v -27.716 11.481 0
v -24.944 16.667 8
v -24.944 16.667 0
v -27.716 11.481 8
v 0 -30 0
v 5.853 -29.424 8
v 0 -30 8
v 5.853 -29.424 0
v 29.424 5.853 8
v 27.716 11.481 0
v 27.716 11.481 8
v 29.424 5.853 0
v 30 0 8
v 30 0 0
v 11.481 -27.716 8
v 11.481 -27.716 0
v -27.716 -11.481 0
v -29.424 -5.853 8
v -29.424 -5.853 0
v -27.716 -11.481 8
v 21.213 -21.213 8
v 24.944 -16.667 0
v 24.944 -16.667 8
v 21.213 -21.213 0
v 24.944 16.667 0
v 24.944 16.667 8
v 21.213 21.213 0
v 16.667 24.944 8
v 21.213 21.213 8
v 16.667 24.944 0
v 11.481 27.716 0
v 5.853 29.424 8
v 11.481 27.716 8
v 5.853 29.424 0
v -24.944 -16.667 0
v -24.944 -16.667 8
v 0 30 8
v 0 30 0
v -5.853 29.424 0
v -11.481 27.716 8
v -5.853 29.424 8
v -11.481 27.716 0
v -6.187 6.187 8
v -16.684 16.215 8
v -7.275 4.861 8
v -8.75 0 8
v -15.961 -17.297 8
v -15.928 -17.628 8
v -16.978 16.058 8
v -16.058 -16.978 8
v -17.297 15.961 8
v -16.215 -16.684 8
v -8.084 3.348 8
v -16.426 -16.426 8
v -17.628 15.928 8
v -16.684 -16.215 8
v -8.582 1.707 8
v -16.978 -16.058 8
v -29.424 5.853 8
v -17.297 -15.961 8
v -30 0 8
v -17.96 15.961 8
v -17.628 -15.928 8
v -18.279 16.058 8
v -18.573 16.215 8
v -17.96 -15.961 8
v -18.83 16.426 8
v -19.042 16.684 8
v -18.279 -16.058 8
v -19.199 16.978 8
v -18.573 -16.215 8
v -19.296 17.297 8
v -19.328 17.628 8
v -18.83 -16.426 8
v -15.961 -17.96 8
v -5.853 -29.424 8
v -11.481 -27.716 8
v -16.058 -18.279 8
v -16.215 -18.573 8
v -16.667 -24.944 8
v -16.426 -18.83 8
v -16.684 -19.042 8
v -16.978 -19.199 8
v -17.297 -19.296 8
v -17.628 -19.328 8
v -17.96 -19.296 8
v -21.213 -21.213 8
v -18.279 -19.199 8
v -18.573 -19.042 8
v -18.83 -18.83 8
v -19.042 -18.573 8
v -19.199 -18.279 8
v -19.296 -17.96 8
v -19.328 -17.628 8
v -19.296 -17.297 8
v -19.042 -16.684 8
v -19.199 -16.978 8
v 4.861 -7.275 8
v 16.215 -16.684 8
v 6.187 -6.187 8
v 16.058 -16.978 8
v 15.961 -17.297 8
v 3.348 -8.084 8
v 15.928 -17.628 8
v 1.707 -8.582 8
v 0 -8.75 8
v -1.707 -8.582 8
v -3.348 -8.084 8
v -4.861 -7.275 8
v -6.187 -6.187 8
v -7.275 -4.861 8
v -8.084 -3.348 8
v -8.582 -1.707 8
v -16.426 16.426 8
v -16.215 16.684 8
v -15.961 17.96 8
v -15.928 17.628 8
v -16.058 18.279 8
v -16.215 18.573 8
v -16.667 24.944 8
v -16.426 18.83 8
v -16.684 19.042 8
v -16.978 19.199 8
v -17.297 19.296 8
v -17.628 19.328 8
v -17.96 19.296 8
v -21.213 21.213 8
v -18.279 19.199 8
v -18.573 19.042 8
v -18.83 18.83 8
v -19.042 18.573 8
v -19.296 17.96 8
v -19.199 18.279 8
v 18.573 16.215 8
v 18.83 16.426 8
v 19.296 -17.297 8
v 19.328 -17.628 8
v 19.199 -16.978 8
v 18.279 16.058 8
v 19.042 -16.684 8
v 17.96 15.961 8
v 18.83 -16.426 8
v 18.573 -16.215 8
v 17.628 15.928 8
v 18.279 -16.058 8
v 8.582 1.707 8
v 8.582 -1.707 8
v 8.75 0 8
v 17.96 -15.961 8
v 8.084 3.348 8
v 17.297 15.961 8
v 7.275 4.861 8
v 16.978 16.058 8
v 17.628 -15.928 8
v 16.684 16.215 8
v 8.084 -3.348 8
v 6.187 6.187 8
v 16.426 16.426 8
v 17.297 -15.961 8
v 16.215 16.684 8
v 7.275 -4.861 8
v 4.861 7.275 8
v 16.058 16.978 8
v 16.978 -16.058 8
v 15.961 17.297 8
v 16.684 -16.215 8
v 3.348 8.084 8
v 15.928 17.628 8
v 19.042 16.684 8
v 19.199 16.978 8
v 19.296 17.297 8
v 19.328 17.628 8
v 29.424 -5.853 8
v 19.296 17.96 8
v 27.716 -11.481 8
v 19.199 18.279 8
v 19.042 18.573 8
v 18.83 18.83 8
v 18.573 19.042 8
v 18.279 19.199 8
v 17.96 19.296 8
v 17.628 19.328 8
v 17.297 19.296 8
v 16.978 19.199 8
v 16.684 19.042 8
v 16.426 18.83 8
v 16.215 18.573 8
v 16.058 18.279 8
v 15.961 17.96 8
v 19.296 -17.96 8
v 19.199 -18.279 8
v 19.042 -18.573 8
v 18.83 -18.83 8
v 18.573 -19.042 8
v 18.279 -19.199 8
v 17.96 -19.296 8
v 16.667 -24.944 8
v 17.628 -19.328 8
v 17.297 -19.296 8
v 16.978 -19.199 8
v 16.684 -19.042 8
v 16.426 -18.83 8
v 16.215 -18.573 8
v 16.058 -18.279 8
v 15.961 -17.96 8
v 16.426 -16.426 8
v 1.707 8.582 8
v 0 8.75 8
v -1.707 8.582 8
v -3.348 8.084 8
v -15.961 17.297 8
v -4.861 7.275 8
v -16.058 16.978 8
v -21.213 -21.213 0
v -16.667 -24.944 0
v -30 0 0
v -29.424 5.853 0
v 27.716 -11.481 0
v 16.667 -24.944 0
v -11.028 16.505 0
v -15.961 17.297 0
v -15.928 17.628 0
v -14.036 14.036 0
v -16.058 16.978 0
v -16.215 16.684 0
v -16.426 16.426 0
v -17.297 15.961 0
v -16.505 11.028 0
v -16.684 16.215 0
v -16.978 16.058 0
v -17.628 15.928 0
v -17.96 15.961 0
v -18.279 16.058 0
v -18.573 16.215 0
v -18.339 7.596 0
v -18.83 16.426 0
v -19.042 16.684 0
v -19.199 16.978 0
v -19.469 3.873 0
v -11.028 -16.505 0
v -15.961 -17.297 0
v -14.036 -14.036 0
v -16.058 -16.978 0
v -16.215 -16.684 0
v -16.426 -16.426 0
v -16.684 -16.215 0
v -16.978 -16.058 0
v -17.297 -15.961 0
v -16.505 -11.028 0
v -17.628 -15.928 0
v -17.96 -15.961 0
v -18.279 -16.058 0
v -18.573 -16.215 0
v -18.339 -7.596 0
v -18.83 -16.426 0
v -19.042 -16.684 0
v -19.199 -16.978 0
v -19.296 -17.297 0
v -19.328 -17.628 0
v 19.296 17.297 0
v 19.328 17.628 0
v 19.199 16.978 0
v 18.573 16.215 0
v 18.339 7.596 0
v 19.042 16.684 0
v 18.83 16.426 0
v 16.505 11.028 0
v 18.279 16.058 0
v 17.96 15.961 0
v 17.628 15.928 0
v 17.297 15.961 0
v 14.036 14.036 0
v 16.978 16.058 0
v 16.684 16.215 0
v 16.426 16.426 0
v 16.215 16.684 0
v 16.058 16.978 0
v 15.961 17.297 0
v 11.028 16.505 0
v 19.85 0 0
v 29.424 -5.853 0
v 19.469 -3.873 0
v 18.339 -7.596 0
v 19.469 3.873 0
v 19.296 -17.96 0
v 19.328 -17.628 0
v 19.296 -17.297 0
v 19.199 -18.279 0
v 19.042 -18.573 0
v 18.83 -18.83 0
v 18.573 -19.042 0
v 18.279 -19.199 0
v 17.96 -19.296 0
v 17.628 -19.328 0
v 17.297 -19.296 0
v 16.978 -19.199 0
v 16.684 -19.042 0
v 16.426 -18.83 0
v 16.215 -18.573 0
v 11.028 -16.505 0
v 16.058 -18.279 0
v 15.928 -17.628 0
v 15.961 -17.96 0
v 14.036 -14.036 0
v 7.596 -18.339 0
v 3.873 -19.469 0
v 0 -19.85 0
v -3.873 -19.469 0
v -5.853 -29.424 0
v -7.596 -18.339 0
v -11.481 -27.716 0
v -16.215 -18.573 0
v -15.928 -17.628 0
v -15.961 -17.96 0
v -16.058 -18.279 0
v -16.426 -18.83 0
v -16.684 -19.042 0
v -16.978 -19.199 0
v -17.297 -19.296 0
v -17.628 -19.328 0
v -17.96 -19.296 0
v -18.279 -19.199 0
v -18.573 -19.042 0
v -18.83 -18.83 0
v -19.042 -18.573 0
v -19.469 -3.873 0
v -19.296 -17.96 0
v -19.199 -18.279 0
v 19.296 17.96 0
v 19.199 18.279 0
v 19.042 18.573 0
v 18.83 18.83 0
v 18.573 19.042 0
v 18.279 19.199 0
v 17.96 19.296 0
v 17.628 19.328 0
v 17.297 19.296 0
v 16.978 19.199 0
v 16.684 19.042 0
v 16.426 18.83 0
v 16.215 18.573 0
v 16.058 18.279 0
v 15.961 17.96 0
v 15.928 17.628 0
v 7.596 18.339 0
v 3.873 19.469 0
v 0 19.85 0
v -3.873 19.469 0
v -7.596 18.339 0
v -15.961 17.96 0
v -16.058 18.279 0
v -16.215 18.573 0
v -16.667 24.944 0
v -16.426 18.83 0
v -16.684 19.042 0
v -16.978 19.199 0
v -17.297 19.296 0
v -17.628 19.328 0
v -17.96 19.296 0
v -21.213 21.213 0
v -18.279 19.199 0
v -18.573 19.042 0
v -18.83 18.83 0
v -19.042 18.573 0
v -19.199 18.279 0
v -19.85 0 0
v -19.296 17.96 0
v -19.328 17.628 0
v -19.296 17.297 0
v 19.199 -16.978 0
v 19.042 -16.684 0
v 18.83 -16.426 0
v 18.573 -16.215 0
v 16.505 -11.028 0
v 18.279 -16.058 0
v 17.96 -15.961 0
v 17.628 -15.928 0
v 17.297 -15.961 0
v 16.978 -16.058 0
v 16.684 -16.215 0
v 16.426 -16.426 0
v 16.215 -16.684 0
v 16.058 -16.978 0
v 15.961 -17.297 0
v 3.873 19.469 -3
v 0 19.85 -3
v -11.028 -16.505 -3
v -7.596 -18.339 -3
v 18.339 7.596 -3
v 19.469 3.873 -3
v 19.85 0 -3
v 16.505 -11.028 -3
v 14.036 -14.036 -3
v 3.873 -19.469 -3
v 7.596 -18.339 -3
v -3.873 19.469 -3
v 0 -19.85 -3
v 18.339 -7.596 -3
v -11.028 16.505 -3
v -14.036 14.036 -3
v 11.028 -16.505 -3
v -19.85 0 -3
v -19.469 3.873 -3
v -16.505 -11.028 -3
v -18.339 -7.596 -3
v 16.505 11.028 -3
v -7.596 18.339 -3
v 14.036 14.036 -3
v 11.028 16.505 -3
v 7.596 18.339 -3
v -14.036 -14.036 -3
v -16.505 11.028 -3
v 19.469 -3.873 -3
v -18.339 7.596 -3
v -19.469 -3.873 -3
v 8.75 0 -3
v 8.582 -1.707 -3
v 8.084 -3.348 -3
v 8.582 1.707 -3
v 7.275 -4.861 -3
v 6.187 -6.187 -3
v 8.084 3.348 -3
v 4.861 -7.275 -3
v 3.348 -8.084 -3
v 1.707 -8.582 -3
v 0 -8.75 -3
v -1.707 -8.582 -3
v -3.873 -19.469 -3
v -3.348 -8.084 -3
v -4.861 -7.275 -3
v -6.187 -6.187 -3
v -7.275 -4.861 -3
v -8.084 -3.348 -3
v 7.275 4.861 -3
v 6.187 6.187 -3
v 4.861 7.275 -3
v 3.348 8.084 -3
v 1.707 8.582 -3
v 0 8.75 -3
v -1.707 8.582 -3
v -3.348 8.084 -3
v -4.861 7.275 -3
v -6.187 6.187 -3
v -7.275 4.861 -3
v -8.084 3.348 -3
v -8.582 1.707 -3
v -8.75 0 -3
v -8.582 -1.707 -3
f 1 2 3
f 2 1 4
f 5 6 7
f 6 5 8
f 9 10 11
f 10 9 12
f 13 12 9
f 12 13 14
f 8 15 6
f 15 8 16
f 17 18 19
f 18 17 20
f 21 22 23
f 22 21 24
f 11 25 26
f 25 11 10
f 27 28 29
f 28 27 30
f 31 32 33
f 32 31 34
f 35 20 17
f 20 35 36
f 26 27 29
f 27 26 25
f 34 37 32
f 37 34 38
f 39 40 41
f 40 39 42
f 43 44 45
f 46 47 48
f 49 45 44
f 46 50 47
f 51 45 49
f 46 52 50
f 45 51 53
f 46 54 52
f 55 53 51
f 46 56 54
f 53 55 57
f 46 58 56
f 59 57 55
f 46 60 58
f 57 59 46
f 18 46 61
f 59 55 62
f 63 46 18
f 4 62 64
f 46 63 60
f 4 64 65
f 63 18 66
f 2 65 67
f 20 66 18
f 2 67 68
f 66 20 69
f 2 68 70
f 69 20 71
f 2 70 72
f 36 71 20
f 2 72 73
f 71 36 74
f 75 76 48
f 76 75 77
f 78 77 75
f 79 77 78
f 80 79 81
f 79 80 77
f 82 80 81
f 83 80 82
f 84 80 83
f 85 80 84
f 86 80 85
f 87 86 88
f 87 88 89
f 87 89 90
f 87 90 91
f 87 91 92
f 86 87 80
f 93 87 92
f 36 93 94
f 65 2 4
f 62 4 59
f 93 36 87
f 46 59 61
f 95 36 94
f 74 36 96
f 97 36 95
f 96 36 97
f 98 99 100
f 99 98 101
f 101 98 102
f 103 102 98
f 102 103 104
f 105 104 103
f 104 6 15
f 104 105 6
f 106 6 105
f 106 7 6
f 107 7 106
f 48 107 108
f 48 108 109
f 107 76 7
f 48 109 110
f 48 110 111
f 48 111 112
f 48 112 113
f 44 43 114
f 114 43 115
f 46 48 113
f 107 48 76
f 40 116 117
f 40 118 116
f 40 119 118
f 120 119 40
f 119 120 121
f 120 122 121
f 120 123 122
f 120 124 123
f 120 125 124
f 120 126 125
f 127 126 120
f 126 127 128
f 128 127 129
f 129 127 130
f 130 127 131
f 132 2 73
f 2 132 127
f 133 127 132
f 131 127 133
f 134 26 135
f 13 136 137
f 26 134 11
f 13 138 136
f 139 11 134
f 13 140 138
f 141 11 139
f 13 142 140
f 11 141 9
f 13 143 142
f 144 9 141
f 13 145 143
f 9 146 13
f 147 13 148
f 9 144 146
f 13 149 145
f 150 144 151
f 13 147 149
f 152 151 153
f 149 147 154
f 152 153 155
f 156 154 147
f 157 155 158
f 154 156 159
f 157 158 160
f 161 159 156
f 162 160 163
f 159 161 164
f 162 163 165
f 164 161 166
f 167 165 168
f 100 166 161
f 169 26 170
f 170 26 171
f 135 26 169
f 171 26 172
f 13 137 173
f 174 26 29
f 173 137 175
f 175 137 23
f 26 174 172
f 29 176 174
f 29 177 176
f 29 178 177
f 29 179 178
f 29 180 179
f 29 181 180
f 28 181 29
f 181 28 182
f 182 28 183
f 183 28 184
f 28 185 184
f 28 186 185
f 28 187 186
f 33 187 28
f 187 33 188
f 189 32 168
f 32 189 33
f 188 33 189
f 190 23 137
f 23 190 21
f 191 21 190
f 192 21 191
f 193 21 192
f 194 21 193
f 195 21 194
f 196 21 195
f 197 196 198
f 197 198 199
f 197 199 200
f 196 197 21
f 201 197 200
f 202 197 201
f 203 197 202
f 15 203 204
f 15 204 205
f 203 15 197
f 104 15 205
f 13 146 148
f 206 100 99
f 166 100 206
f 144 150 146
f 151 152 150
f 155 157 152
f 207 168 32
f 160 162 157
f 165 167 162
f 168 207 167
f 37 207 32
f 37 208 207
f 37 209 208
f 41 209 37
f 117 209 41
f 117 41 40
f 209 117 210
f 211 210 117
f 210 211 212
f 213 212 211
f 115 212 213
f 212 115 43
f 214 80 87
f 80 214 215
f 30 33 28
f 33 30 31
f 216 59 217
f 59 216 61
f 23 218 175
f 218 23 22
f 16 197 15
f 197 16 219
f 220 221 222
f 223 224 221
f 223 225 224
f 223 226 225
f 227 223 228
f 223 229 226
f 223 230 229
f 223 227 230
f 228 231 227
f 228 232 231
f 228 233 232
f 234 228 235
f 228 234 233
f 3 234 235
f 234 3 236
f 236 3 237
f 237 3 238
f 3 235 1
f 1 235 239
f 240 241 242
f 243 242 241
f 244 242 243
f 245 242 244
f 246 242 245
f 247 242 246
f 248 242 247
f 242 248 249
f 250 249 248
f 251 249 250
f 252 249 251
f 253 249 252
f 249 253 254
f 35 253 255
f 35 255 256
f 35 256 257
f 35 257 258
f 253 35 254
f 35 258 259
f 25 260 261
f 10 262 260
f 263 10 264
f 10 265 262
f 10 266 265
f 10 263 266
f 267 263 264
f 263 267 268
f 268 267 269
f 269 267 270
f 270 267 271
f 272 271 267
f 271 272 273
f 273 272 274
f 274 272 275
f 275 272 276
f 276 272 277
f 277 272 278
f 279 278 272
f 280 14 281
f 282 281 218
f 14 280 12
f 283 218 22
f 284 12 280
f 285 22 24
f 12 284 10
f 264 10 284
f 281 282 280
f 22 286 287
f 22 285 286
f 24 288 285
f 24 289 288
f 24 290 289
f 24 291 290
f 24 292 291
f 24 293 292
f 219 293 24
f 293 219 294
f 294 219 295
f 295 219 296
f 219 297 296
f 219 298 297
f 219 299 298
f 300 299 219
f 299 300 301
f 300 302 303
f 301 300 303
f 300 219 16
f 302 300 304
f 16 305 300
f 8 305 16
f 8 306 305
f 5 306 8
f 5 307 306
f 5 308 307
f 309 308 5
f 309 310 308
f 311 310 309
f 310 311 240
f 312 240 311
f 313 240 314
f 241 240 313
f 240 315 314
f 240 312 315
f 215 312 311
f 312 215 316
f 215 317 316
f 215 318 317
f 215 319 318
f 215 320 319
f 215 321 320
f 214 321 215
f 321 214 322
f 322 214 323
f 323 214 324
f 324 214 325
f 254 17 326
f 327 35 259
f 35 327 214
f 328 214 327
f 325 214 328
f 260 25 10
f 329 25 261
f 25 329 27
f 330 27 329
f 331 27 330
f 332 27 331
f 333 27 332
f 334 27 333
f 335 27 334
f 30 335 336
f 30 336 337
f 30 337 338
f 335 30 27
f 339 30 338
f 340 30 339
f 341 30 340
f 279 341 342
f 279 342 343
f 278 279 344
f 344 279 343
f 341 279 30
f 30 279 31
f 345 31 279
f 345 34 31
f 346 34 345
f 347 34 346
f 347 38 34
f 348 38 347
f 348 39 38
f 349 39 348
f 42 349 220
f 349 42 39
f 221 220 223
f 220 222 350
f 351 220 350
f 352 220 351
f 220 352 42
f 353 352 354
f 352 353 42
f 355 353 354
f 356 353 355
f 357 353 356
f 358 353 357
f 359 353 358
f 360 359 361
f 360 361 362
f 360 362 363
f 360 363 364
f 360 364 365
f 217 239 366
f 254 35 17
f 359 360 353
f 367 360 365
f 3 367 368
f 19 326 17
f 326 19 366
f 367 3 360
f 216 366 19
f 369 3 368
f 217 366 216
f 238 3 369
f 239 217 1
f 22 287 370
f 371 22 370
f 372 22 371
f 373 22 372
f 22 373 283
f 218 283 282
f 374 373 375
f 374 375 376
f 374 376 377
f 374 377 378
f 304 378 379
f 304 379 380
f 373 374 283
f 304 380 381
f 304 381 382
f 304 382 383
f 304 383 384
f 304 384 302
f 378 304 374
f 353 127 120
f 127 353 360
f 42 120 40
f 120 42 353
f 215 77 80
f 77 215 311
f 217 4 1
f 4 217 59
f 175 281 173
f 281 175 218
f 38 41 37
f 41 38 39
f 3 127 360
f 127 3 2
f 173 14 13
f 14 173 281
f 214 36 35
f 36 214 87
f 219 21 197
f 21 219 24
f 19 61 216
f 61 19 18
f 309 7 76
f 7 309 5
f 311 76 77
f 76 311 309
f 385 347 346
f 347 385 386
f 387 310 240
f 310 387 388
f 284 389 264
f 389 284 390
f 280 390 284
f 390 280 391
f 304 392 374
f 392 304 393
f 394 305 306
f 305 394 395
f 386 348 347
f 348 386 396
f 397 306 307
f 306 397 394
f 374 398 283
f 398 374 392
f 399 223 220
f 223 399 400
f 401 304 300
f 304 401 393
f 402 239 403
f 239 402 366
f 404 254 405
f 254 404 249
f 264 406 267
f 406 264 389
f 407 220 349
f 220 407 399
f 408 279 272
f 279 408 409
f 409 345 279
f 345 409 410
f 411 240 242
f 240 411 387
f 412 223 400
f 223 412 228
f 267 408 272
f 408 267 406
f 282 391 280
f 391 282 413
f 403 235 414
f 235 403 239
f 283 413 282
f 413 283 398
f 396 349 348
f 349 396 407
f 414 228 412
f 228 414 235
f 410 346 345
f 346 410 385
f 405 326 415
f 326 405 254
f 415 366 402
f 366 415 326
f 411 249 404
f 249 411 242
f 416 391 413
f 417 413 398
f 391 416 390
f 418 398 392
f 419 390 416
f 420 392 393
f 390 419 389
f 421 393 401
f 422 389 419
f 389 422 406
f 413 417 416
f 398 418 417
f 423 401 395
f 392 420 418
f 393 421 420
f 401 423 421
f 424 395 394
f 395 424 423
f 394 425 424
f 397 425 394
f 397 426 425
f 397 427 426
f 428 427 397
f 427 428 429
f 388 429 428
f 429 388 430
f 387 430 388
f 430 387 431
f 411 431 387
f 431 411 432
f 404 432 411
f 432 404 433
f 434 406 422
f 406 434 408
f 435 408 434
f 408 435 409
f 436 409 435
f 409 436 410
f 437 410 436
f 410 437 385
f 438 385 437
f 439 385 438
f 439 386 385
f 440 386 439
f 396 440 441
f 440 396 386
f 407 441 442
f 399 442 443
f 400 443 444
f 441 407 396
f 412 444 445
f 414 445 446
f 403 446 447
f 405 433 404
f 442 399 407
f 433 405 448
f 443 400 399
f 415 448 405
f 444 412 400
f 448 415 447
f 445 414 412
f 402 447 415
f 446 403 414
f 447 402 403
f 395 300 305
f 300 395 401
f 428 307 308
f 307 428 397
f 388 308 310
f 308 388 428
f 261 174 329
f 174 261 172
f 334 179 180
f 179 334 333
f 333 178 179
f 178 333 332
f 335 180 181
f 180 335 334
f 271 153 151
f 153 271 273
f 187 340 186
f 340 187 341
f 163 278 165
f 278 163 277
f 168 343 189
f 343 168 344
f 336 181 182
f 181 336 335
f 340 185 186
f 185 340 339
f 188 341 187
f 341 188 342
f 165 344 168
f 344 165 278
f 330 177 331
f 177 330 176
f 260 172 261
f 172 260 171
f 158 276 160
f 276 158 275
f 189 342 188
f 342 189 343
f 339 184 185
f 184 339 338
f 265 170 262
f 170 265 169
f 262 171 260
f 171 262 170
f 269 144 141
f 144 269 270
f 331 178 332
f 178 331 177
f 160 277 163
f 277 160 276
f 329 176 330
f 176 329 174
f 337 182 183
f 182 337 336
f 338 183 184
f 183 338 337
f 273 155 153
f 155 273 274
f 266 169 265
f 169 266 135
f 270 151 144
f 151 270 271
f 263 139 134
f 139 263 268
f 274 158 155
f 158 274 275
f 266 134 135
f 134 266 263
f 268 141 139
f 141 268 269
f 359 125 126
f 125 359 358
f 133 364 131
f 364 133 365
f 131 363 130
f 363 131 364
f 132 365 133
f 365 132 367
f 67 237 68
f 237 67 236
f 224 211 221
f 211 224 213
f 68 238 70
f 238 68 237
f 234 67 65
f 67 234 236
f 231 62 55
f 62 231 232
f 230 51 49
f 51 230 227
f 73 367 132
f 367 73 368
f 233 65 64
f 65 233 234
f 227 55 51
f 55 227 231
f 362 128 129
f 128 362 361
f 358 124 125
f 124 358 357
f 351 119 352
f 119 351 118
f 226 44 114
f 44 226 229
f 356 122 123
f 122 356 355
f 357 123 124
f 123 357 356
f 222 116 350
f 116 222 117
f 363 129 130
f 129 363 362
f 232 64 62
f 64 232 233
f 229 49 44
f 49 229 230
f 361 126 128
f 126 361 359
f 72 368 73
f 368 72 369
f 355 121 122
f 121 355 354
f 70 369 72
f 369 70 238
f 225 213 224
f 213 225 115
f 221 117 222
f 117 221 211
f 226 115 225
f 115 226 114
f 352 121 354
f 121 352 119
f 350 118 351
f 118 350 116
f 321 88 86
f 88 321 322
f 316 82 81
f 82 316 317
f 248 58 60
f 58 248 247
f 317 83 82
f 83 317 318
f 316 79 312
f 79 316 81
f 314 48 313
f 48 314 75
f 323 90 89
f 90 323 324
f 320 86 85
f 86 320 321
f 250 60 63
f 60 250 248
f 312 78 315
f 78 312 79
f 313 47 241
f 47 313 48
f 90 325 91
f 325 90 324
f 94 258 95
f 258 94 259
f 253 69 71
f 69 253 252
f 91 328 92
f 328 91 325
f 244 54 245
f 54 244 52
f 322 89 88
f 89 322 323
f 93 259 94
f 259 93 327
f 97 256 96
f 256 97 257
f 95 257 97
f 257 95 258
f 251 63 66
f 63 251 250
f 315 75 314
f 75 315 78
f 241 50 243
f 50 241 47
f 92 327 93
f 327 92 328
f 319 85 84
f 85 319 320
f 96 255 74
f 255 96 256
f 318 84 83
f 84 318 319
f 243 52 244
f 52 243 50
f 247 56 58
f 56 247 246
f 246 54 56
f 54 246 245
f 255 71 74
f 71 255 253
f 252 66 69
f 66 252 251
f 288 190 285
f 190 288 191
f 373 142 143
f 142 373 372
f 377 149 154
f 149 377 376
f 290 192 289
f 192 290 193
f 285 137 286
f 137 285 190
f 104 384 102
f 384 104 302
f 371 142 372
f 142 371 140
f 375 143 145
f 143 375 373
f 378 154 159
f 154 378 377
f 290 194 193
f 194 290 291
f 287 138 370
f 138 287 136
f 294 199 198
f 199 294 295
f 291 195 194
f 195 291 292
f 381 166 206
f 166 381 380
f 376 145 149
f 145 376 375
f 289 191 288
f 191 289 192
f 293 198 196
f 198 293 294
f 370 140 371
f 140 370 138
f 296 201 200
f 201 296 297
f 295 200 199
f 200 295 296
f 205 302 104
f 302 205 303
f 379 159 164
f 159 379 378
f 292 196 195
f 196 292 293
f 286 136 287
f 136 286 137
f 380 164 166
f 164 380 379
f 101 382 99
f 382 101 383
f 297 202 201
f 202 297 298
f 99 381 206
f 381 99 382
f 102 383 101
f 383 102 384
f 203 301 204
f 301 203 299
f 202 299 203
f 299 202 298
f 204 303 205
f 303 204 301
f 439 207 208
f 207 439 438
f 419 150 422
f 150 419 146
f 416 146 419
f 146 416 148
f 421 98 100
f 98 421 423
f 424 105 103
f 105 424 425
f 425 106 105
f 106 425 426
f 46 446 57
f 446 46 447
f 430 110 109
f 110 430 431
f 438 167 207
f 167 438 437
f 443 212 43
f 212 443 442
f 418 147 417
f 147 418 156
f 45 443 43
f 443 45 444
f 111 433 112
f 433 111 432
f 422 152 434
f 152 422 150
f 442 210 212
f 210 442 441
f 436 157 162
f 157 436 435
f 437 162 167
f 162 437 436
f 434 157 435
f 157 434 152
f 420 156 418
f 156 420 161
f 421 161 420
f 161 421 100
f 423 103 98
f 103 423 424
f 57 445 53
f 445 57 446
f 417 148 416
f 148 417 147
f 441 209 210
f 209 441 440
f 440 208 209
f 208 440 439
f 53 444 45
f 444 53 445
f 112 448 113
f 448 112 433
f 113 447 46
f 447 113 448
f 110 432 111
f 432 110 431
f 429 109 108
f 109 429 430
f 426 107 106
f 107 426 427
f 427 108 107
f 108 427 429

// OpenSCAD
$fn = 32;

// ----------------------------------------------------------------------
// Retaining cap: 6203 cover, 60 mm, spigot 39.7 mm
// ----------------------------------------------------------------------

// --- parameters (mm) ---
plate_d = 60;             // cover diameter
plate_t = 8;              // cover thickness
boss_d = 39.7;            // spigot that enters the housing
boss_h = 3;               // spigot height
shaft_d = 17.5;           // shaft opening
bolt_d = 3.4;             // bolt clearance
bolt_r = 24.93;           // bolt circle radius

module cover() {
  cylinder(h = plate_t, d = plate_d);
}

module spigot() {
  /* sunk 1 mm into the cover; the spigot sets the overall height */
  translate([0, 0, -boss_h]) cylinder(h = boss_h + 1, d = boss_d);
}

difference() {
  union() {
    cover();
    spigot();
  }
  for (i = [0 : 3]) rotate([0, 0, 45 + i * 90]) translate([bolt_r, 0, -boss_h - 1])
    cylinder(h = boss_h + plate_t + 2, d = bolt_d);
  translate([0, 0, -boss_h - 1]) cylinder(h = boss_h + plate_t + 2, d = shaft_d);
}
